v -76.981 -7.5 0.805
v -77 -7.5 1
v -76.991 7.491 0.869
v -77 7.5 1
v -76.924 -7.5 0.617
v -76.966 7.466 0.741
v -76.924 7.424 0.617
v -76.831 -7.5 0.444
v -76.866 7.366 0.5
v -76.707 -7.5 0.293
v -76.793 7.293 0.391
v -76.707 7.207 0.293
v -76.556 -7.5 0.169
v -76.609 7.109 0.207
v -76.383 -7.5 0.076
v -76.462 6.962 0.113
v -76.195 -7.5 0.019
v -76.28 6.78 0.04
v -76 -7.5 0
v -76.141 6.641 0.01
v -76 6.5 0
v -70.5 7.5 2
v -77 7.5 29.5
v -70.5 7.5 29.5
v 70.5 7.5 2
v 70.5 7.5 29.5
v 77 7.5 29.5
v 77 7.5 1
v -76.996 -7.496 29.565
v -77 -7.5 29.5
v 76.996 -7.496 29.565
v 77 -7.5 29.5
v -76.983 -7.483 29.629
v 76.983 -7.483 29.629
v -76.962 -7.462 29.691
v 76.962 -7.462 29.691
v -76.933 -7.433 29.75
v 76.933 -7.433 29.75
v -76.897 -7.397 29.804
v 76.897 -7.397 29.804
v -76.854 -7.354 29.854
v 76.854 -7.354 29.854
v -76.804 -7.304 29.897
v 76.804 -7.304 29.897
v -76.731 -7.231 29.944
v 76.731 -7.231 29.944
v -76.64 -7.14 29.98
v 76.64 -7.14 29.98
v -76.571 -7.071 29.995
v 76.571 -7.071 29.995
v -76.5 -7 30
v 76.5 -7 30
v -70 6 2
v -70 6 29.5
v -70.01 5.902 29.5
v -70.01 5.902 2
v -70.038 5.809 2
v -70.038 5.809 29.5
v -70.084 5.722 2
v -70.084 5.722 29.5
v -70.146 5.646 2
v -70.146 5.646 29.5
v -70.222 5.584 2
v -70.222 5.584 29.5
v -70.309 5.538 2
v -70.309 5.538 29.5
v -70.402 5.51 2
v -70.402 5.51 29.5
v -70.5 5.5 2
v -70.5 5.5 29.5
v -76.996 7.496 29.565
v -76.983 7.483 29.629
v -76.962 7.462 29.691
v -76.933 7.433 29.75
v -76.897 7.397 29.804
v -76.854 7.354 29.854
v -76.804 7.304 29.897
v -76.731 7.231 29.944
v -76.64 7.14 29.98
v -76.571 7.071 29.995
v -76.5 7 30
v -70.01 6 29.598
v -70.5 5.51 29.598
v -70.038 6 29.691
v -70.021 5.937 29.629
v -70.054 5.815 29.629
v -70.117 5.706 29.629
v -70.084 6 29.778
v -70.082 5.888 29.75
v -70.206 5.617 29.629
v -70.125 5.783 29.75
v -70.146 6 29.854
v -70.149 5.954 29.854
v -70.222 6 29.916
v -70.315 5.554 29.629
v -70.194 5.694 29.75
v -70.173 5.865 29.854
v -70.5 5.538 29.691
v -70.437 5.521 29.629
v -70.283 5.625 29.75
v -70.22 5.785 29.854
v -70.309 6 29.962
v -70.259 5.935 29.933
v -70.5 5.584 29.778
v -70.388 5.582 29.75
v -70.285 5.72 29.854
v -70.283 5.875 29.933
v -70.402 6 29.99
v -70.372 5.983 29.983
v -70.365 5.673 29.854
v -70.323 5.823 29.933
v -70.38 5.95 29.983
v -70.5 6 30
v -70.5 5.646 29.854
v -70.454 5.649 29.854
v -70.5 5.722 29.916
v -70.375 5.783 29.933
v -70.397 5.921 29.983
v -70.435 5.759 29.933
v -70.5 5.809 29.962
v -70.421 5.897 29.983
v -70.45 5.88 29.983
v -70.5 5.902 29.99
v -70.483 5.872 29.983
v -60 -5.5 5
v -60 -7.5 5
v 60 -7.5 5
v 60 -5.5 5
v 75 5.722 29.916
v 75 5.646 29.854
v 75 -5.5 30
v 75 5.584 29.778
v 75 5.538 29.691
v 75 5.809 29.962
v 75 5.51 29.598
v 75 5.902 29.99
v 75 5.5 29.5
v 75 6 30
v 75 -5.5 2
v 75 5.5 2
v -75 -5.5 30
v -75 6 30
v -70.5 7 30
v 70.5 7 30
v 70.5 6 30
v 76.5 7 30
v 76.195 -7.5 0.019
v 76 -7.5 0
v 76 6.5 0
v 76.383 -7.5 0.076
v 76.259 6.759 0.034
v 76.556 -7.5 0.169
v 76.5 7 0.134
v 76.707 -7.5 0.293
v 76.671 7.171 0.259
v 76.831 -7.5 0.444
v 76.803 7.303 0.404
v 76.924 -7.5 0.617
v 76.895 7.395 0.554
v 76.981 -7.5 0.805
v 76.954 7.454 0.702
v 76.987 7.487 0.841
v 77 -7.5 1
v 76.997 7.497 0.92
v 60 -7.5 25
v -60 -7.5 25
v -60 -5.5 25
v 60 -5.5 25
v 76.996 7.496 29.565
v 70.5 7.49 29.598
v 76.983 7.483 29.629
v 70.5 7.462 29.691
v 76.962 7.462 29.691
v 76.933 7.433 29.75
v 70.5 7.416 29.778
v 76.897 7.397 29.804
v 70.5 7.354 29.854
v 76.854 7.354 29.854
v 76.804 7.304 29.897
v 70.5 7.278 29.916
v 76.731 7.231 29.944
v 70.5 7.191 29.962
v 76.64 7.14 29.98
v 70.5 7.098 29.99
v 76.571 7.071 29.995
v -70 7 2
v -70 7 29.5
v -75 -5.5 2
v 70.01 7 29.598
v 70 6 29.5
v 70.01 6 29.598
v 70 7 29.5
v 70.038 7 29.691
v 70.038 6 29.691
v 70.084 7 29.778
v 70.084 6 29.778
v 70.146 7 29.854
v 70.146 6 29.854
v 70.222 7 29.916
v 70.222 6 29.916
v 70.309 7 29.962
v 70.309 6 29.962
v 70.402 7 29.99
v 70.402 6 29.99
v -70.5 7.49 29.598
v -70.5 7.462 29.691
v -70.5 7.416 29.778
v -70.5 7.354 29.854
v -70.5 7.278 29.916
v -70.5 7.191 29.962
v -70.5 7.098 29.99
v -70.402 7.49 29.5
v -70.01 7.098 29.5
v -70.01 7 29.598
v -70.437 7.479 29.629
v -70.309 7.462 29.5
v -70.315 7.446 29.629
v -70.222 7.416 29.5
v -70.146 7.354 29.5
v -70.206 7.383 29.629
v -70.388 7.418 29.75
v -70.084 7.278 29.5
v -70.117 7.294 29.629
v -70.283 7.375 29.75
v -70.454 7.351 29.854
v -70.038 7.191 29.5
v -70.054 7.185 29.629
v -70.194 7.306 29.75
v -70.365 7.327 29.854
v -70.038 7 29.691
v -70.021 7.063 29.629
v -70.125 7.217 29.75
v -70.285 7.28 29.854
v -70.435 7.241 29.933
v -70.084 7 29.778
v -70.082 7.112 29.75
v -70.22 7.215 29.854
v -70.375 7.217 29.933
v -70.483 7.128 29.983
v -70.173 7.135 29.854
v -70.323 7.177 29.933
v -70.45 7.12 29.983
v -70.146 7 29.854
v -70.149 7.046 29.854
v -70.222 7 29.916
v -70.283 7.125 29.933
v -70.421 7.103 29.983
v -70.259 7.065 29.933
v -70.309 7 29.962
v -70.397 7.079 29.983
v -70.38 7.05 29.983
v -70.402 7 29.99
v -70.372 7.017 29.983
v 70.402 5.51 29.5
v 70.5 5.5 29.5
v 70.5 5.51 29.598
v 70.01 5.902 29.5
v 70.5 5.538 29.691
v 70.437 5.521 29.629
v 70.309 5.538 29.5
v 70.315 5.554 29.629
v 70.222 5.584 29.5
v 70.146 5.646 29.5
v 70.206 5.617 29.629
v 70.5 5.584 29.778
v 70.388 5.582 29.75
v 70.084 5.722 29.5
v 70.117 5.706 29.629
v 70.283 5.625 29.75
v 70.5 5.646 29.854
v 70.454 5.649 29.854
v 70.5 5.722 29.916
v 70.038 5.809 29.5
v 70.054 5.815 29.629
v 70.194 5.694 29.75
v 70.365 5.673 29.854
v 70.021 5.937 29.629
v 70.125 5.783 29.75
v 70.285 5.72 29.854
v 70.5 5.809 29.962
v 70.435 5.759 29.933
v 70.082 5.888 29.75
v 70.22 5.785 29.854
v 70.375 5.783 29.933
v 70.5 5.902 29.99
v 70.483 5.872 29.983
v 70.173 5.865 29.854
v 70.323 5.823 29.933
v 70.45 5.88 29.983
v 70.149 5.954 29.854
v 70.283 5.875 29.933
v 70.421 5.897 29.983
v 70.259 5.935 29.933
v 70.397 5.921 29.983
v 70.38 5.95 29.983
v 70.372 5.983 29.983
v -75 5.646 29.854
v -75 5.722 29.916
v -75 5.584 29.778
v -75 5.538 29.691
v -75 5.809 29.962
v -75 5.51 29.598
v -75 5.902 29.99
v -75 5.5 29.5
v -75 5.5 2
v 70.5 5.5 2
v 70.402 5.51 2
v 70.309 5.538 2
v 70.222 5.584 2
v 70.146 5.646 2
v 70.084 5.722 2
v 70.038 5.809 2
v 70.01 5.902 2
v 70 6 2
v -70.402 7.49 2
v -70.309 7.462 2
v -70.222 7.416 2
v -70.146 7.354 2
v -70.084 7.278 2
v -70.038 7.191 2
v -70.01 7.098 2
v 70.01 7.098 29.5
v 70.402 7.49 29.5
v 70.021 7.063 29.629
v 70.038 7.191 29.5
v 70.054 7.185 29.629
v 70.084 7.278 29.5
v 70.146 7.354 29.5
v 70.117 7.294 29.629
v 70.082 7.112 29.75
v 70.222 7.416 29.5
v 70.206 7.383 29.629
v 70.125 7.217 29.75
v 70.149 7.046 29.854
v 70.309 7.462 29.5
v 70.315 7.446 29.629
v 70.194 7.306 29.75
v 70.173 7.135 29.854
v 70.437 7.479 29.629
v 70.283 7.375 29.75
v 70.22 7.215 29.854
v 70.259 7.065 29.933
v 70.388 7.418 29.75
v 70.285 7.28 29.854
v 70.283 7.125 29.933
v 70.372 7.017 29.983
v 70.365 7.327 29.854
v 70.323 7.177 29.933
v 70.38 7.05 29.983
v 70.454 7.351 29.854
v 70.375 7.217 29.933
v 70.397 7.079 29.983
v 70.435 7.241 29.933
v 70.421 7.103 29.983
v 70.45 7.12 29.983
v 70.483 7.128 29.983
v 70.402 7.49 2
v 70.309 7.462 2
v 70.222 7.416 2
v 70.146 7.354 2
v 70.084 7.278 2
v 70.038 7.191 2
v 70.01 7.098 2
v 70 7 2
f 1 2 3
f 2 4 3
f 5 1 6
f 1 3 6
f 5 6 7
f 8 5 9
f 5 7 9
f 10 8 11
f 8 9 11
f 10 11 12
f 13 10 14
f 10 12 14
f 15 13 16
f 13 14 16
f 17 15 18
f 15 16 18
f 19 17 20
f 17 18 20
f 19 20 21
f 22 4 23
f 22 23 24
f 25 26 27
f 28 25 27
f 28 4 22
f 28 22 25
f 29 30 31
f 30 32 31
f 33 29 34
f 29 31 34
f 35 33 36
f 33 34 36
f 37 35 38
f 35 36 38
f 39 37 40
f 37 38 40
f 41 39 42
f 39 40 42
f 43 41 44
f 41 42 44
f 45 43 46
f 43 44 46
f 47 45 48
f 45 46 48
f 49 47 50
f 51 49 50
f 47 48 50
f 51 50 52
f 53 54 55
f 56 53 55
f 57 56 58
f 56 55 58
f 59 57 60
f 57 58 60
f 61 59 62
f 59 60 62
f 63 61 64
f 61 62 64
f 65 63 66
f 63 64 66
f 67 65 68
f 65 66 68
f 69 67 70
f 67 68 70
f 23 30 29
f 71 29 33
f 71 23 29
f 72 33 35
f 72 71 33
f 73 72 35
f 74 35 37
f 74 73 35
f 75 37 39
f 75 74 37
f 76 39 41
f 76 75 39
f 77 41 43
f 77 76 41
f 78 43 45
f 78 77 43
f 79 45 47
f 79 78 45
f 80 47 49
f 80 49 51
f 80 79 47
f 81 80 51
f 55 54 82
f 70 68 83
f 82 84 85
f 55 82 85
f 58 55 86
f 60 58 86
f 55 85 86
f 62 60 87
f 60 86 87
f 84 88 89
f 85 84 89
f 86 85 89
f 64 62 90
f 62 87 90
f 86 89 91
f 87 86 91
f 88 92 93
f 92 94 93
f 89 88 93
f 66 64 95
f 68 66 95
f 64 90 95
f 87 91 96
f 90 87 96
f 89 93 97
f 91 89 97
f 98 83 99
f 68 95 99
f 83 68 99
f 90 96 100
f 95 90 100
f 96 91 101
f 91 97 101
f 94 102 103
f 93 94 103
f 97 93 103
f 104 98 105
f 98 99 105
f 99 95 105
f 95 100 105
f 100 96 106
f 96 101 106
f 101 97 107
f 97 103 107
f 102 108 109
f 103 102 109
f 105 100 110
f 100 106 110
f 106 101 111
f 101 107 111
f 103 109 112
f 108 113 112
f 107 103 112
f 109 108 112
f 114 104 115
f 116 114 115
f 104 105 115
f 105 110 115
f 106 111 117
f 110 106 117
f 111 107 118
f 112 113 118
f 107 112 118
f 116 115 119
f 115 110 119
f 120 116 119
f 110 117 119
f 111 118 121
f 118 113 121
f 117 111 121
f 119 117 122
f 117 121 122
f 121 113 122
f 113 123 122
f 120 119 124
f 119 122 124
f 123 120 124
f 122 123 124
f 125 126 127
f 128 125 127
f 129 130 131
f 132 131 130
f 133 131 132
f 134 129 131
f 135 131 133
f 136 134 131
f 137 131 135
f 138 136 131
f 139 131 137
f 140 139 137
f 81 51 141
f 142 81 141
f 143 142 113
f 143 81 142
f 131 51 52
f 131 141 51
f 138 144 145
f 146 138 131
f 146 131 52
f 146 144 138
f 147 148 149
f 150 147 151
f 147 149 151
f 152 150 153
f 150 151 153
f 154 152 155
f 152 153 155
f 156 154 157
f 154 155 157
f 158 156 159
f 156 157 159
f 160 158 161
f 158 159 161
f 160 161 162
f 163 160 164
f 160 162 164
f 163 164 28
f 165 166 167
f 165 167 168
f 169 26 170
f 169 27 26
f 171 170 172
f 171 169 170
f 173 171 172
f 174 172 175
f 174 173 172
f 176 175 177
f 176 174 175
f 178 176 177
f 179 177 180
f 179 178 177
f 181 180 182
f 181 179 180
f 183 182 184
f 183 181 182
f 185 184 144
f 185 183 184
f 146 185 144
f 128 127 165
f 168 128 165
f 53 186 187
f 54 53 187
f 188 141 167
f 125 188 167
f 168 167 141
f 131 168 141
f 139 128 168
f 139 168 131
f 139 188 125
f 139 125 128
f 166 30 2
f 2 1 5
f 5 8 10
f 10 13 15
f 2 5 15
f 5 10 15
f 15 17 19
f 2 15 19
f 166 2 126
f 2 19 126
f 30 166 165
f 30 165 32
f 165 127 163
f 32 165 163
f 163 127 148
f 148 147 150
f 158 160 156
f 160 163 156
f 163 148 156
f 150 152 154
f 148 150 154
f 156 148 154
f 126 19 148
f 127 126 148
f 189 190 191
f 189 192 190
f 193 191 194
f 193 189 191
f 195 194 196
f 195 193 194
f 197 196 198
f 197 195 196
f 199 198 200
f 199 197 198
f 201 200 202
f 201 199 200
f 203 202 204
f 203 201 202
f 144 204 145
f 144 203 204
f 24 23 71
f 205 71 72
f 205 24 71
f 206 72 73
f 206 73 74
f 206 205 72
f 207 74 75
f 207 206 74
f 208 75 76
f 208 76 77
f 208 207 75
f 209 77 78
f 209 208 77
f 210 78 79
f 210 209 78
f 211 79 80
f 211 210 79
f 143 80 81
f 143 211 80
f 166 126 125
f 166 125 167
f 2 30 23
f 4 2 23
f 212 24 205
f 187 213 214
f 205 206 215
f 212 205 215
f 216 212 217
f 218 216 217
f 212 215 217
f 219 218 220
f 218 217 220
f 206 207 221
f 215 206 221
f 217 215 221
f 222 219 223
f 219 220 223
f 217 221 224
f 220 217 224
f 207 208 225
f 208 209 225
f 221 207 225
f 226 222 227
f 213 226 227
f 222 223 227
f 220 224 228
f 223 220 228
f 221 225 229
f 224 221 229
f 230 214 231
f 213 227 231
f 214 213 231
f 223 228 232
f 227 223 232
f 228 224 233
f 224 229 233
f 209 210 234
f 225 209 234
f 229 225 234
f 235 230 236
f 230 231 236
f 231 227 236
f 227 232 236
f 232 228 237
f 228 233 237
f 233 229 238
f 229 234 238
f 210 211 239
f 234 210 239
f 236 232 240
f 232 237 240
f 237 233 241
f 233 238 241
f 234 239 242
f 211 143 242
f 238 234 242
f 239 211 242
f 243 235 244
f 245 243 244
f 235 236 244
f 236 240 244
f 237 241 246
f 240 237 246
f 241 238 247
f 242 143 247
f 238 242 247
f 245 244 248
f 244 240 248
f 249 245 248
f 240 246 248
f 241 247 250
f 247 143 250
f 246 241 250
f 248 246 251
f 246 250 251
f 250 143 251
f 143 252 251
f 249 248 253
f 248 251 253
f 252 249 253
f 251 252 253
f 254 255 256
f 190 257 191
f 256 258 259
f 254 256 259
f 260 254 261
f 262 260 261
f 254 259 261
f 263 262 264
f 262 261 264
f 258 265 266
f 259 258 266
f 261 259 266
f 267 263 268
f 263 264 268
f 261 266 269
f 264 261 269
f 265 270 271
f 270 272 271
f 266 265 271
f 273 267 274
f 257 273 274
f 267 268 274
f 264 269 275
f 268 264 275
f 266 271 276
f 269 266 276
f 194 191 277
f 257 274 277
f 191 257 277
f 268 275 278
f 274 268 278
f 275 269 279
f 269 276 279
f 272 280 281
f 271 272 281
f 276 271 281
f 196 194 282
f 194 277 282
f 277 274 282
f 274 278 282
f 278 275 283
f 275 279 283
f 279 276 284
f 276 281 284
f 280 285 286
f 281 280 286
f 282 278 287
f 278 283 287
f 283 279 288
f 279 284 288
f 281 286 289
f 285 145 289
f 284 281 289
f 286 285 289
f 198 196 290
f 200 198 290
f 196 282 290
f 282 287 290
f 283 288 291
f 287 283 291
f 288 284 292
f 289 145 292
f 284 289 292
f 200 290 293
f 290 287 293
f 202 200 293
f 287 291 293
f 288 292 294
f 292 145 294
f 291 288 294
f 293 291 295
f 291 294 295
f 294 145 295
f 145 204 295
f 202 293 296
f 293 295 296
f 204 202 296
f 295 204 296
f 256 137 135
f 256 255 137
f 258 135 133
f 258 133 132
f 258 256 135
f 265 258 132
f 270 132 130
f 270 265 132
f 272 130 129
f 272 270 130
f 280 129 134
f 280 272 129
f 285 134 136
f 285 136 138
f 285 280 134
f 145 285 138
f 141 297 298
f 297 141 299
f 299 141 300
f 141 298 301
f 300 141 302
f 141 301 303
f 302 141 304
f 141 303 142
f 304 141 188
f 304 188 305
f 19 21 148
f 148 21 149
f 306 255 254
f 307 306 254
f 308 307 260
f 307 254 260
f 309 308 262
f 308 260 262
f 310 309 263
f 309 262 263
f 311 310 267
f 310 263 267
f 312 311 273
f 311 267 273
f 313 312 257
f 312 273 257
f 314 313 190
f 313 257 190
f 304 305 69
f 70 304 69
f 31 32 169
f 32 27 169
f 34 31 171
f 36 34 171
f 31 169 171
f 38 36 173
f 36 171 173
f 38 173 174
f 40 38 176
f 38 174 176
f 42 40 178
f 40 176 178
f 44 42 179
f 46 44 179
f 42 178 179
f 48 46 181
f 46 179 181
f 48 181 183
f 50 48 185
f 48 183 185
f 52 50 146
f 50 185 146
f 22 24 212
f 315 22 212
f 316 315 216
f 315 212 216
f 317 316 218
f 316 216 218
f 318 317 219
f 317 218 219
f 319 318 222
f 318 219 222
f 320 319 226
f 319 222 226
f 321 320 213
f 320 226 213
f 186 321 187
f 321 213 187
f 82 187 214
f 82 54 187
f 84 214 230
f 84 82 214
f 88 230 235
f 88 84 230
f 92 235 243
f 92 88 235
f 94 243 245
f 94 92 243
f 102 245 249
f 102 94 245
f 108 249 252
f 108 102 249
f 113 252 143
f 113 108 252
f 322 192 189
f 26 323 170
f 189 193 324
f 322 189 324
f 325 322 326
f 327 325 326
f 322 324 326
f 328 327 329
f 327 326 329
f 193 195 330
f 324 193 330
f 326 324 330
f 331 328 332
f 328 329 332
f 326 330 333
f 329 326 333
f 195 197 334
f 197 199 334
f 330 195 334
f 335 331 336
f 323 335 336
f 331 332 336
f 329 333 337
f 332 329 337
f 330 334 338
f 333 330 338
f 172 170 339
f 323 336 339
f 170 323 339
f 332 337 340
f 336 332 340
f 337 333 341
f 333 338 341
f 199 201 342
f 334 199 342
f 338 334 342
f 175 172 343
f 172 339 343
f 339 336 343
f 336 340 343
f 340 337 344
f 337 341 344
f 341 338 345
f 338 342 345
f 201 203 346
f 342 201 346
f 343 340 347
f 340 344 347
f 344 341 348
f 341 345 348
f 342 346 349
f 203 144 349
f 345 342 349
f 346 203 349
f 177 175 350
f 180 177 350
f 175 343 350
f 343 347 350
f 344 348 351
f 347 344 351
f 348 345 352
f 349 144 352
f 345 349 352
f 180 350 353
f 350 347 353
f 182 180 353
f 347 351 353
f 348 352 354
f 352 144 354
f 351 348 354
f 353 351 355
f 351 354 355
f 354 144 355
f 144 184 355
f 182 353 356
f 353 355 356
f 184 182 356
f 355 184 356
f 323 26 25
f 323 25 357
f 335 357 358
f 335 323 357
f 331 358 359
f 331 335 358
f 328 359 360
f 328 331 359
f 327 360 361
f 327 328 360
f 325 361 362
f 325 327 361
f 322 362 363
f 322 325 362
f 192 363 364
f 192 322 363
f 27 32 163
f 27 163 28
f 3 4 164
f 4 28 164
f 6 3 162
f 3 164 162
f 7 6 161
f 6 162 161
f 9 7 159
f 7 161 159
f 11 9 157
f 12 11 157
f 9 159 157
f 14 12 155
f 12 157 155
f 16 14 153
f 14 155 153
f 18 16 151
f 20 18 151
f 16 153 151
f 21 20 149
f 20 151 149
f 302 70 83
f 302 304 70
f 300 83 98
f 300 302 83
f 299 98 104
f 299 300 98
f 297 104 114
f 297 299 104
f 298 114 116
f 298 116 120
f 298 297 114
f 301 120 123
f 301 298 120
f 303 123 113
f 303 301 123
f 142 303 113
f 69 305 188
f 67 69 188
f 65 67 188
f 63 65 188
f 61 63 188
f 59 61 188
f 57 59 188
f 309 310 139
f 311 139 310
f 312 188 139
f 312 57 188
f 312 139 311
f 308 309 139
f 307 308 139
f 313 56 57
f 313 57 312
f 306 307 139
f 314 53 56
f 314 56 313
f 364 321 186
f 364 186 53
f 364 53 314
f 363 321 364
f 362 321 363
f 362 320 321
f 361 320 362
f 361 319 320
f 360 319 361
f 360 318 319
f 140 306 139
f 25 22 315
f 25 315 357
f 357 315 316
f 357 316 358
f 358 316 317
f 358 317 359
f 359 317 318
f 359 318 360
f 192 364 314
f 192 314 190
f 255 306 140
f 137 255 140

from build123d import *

# Parameters (mm, degrees)
SKETCH_W        = 154
SKETCH_H        = 15
PAD_DEPTH       = 30
SKETCH001_W     = 150
SKETCH001_H     = 11
POCKET_DEPTH    = 28
SKETCH002_W     = 140
SKETCH002_H     = 28
POCKET001_DEPTH = 2
SKETCH003_W     = 120
SKETCH003_H     = 20
POCKET002_DEPTH = 5
FILLET_R        = 0.5
FILLET001_R     = 0.5
FILLET002_R     = 0.5
FILLET003_R     = 1


with BuildPart() as part:
    # Sketch → Pad (new body)
    with BuildSketch(Plane.XY):
        Rectangle(SKETCH_W, SKETCH_H)
    extrude(amount=PAD_DEPTH)

    # Sketch001 → Pocket (cut)
    with BuildSketch(Plane.XY.offset(2)):
        Rectangle(SKETCH001_W, SKETCH001_H)
    extrude(amount=POCKET_DEPTH, mode=Mode.SUBTRACT)

    # Sketch002 (on Face7 of Pocket) → Pocket001 (cut)
    with BuildSketch(Plane.XZ.offset(-7.5)):
        with Locations((0, 16)):
            Rectangle(SKETCH002_W, SKETCH002_H)
    extrude(amount=POCKET001_DEPTH, mode=Mode.SUBTRACT)

    # Sketch003 → Pocket002 (cut)
    with BuildSketch(Plane.XZ.offset(8)):
        with Locations((0, 15)):
            Rectangle(SKETCH003_W, SKETCH003_H)
    extrude(amount=-POCKET002_DEPTH, mode=Mode.SUBTRACT)

    # Fillet
    fillet_edges = [part.edges().sort_by_distance(p)[0] for p in [
        (-70, 7.5, 16),
        (-70, 5.5, 16),
    ]]
    fillet(fillet_edges, radius=FILLET_R)

    # Fillet001
    fillet001_edges = [part.edges().sort_by_distance(p)[0] for p in [
        (70, 5.5, 16),
        (70, 7.5, 16),
    ]]
    fillet(fillet001_edges, radius=FILLET001_R)

    # Fillet002
    fillet002_edges = [part.edges().sort_by_distance(p)[0] for p in [
        (-77, 0, 30),
        (0, -7.5, 30),
        (77, 0, 30),
        (73.75, 7.5, 30),
        (-73.75, 7.5, 30),
    ]]
    fillet(fillet002_edges, radius=FILLET002_R)

    # Fillet003
    fillet003_edges = [part.edges().sort_by_distance(p)[0] for p in [
        (77, 0, 0),
        (0, 7.5, 0),
        (-77, 0, 0),
    ]]
    fillet(fillet003_edges, radius=FILLET003_R)


solid = part.part
